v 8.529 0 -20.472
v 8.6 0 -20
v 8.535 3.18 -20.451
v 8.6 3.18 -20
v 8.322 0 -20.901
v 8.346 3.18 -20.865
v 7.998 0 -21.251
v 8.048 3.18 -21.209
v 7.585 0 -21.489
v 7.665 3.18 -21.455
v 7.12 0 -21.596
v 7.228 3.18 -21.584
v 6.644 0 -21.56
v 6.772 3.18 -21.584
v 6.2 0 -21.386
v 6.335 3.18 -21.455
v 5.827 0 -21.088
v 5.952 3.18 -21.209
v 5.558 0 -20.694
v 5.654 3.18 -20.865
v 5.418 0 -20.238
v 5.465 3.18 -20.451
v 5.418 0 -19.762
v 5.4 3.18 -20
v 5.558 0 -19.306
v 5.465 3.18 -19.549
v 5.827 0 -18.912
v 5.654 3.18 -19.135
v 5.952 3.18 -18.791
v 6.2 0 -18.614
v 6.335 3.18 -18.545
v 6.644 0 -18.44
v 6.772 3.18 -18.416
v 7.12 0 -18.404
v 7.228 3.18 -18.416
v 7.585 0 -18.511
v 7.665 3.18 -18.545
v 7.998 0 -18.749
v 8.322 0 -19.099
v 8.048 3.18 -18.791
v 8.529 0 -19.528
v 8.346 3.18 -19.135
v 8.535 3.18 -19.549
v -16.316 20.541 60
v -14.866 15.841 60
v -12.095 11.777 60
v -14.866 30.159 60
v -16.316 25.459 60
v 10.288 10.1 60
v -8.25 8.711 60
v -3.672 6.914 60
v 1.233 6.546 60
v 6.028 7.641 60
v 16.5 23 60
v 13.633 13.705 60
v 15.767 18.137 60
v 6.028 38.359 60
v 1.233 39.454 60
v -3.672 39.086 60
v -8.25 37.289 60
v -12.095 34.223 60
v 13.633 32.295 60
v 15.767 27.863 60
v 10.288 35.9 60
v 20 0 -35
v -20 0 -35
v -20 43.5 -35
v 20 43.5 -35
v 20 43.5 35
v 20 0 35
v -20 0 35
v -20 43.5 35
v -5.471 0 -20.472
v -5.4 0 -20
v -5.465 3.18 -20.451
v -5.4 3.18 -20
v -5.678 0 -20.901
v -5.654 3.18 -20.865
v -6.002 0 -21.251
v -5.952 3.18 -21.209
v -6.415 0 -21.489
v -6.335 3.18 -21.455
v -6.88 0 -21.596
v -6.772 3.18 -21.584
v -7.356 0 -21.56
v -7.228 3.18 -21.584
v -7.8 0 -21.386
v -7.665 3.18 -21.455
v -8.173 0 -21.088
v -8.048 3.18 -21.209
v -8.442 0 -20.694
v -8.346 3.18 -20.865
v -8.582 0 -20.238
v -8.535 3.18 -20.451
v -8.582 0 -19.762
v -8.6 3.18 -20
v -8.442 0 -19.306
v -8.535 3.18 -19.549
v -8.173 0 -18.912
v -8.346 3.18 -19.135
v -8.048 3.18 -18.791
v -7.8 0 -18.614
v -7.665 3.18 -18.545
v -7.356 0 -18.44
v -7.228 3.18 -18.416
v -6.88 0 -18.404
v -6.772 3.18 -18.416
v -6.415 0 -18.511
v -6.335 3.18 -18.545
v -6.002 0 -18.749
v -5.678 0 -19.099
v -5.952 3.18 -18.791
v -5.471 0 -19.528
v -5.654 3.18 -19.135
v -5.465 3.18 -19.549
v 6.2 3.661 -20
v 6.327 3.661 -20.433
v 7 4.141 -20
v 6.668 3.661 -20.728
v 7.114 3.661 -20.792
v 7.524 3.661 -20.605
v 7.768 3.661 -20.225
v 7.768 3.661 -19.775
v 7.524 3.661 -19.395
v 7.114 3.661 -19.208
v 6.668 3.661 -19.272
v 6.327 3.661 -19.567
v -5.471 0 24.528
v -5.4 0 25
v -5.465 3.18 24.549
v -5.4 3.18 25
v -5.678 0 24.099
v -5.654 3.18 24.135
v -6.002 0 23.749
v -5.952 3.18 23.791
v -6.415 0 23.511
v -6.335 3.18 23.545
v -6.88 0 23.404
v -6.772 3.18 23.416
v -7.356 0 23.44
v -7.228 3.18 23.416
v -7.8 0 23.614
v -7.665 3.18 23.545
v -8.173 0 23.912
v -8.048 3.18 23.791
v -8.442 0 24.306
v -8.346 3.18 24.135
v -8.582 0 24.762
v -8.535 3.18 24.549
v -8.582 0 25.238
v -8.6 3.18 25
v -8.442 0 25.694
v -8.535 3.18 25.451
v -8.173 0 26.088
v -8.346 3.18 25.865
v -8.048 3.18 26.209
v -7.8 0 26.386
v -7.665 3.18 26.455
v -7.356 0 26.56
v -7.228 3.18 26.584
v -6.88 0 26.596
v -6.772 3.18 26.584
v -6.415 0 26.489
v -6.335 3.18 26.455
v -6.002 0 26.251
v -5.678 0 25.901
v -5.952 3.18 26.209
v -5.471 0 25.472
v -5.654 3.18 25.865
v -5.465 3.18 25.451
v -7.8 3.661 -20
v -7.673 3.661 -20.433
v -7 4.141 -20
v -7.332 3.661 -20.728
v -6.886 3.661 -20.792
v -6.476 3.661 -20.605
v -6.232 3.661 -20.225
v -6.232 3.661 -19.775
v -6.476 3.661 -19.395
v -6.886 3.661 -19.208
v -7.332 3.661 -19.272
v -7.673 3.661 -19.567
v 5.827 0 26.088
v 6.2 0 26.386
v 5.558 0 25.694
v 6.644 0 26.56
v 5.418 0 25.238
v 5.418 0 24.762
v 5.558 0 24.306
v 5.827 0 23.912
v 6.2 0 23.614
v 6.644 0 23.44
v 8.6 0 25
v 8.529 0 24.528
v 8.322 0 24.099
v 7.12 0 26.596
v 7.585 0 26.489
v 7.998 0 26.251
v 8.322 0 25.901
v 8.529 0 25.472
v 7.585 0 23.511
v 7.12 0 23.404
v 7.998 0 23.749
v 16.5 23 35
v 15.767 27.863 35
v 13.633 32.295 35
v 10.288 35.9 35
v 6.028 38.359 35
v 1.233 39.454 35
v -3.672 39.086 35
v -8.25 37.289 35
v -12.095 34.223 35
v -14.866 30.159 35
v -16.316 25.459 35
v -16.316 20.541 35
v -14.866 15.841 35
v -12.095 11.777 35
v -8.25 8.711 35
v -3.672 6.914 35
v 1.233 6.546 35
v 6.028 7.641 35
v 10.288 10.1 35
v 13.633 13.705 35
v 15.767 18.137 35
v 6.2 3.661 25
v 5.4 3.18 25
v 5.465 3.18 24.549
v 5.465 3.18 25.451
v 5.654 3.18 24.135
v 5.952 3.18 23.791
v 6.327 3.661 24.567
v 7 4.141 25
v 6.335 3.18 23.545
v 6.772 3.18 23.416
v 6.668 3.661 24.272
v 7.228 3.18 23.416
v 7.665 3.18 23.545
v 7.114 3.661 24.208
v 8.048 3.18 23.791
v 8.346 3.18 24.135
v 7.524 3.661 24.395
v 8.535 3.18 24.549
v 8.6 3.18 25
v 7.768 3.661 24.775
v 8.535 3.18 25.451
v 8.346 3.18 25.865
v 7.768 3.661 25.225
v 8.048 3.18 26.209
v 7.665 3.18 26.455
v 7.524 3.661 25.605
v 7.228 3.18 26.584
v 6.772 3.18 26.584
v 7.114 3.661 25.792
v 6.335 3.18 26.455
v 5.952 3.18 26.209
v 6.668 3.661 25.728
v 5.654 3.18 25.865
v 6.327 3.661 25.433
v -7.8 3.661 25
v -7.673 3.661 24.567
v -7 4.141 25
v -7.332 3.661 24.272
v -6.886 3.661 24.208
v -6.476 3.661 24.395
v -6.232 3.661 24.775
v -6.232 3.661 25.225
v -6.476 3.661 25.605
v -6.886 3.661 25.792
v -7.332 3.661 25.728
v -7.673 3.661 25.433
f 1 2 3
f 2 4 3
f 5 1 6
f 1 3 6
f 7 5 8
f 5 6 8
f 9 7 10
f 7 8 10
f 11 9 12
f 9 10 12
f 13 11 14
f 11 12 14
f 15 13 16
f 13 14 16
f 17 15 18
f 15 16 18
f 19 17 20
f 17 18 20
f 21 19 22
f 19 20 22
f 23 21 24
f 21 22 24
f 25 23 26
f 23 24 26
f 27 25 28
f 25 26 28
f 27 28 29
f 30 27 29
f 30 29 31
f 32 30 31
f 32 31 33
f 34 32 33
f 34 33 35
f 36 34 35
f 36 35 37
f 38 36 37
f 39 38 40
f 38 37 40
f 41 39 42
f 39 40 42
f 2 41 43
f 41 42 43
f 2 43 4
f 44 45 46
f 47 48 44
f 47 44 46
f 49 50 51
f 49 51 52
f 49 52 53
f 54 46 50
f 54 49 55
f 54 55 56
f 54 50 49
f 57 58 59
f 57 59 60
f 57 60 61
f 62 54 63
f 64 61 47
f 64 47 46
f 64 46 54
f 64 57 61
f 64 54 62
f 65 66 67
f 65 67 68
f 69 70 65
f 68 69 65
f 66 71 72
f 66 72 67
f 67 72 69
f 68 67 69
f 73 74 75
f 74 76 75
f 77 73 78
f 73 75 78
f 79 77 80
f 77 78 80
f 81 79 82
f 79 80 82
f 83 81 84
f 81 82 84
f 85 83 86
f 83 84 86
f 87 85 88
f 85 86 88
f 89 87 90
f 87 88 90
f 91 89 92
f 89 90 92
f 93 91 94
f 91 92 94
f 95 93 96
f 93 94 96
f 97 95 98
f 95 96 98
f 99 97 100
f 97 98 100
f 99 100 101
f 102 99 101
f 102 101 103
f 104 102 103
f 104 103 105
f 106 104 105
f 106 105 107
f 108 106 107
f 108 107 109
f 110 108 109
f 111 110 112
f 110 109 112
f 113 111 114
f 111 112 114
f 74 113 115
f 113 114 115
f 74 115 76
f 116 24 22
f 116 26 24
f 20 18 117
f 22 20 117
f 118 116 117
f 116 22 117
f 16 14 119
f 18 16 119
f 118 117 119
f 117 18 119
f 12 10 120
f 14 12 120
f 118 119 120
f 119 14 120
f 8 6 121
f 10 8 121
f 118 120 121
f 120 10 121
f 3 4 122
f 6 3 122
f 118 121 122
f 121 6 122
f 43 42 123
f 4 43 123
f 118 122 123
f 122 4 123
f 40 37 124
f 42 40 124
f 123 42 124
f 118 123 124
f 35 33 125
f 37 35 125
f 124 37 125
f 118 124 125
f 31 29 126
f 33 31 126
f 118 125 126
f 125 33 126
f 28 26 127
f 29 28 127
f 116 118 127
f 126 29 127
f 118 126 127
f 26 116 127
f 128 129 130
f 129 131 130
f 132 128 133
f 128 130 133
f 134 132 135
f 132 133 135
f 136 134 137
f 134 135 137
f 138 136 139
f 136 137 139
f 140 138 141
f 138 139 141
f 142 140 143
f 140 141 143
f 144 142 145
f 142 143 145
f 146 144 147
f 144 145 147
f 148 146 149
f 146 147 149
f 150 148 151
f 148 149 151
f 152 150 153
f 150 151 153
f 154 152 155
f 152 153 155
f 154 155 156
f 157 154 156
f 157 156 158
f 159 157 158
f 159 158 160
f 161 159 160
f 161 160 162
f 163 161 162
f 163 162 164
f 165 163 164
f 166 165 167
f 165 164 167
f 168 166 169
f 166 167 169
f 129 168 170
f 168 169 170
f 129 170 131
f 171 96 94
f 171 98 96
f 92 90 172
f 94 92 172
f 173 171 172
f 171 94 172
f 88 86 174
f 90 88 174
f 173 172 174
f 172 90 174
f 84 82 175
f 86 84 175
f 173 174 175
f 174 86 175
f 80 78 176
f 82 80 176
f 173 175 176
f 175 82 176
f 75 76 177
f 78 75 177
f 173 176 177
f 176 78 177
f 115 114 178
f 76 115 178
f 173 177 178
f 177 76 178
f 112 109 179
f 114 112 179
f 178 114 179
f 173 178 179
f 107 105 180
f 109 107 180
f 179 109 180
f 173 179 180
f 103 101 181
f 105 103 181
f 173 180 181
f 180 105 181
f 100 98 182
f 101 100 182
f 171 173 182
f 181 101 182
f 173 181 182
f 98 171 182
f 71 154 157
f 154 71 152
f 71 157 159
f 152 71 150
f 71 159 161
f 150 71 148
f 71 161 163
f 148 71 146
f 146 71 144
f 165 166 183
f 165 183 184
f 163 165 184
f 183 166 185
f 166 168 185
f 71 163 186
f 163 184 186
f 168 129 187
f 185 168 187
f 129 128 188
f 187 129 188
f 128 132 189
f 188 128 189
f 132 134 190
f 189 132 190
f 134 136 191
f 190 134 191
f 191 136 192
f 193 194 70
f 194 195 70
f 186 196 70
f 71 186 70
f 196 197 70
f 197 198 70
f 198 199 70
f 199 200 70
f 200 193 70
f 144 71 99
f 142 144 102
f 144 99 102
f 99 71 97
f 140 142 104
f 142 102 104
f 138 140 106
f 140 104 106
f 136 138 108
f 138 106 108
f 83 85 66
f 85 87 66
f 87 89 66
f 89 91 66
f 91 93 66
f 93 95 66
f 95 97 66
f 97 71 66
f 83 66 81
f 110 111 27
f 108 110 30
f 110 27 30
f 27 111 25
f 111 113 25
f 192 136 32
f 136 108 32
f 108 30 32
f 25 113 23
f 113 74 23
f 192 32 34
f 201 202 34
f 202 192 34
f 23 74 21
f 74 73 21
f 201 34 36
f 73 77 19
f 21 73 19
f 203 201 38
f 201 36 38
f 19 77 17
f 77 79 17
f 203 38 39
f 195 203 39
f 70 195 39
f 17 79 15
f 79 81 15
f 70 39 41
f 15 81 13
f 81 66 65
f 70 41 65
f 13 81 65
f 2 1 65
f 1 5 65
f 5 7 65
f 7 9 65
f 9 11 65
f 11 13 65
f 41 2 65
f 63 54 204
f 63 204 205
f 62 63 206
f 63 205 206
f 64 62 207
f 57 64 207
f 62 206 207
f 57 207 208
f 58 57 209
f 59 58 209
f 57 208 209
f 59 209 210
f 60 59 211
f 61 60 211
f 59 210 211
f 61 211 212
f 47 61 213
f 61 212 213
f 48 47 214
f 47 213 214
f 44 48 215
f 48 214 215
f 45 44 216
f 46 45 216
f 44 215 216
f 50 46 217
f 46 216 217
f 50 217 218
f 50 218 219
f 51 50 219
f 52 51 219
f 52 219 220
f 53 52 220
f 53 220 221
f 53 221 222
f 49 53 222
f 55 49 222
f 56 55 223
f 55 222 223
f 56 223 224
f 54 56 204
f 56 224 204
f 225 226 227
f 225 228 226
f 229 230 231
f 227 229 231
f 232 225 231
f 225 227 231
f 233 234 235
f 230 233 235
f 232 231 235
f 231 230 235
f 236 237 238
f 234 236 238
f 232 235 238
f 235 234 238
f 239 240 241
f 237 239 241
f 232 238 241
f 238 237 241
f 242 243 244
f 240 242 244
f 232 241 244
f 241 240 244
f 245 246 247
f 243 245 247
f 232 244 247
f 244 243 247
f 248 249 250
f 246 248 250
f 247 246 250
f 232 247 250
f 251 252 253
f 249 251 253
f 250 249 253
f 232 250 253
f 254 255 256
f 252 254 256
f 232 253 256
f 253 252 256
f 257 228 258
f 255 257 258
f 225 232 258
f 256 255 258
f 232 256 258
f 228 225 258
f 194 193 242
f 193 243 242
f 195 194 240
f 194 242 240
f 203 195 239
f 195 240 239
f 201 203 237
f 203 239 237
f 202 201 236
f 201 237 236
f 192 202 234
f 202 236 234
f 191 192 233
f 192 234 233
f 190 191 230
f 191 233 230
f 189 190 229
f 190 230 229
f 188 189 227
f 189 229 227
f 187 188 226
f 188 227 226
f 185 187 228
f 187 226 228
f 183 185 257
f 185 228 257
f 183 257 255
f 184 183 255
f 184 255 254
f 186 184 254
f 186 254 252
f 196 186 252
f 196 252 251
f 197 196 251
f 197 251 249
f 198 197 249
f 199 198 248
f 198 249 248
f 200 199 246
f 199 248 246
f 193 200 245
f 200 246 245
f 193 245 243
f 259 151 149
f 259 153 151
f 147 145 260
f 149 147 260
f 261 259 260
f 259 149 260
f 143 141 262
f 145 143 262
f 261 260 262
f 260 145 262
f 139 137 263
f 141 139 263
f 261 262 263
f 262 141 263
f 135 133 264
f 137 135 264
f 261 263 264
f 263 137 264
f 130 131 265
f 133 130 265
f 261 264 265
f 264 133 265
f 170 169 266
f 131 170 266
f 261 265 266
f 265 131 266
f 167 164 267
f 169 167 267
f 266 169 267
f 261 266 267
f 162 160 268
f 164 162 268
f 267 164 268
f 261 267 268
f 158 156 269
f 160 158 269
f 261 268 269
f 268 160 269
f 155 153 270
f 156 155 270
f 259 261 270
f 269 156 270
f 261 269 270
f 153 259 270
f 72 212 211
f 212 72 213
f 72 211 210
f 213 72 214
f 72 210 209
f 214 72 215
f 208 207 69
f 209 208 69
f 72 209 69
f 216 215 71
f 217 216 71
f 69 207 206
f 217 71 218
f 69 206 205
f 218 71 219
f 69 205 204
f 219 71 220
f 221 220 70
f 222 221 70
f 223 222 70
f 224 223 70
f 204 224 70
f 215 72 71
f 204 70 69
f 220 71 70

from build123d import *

# Parameters (mm, degrees)
SKETCH2_W                = 40
SKETCH2_H                = 70
BOSS_EXTRUDE1_DEPTH      = 43.5
SKETCH4_R                = 16.5
BOSS_EXTRUDE2_DEPTH      = 25
M3_CLEARANCE_HOLE1_D     = 3.2
M3_CLEARANCE_HOLE1_DEPTH = 3.18
M3_CLEARANCE_HOLE1_TIP   = 0.96137699


with BuildPart() as part:
    # Sketch2 → Boss-Extrude1 (new body)
    with BuildSketch(Plane(origin=(0, 0, 0), x_dir=(1, 0, 0), z_dir=(0, 1, 0))):
        Rectangle(SKETCH2_W, SKETCH2_H)
    extrude(amount=BOSS_EXTRUDE1_DEPTH)

    # Sketch4 → Boss-Extrude2 (add)
    with BuildSketch(Plane.XY.offset(35)):
        with Locations((0, 23)):
            Circle(SKETCH4_R)
    extrude(amount=BOSS_EXTRUDE2_DEPTH)

    # M3 Clearance Hole1
    with Locations(Plane(origin=(0, 0, 0), x_dir=(-1, 0, 0), z_dir=(0, -1, 0))):
        with Locations((-7, 20), (7, 20), (7, -25), (-7, -25)):
            Hole(M3_CLEARANCE_HOLE1_D / 2, depth=M3_CLEARANCE_HOLE1_DEPTH)
            with Locations((0, 0, -(M3_CLEARANCE_HOLE1_DEPTH + M3_CLEARANCE_HOLE1_TIP / 2))):  # 118° drill point
                Cone(0, M3_CLEARANCE_HOLE1_D / 2, M3_CLEARANCE_HOLE1_TIP, mode=Mode.SUBTRACT)


solid = part.part
